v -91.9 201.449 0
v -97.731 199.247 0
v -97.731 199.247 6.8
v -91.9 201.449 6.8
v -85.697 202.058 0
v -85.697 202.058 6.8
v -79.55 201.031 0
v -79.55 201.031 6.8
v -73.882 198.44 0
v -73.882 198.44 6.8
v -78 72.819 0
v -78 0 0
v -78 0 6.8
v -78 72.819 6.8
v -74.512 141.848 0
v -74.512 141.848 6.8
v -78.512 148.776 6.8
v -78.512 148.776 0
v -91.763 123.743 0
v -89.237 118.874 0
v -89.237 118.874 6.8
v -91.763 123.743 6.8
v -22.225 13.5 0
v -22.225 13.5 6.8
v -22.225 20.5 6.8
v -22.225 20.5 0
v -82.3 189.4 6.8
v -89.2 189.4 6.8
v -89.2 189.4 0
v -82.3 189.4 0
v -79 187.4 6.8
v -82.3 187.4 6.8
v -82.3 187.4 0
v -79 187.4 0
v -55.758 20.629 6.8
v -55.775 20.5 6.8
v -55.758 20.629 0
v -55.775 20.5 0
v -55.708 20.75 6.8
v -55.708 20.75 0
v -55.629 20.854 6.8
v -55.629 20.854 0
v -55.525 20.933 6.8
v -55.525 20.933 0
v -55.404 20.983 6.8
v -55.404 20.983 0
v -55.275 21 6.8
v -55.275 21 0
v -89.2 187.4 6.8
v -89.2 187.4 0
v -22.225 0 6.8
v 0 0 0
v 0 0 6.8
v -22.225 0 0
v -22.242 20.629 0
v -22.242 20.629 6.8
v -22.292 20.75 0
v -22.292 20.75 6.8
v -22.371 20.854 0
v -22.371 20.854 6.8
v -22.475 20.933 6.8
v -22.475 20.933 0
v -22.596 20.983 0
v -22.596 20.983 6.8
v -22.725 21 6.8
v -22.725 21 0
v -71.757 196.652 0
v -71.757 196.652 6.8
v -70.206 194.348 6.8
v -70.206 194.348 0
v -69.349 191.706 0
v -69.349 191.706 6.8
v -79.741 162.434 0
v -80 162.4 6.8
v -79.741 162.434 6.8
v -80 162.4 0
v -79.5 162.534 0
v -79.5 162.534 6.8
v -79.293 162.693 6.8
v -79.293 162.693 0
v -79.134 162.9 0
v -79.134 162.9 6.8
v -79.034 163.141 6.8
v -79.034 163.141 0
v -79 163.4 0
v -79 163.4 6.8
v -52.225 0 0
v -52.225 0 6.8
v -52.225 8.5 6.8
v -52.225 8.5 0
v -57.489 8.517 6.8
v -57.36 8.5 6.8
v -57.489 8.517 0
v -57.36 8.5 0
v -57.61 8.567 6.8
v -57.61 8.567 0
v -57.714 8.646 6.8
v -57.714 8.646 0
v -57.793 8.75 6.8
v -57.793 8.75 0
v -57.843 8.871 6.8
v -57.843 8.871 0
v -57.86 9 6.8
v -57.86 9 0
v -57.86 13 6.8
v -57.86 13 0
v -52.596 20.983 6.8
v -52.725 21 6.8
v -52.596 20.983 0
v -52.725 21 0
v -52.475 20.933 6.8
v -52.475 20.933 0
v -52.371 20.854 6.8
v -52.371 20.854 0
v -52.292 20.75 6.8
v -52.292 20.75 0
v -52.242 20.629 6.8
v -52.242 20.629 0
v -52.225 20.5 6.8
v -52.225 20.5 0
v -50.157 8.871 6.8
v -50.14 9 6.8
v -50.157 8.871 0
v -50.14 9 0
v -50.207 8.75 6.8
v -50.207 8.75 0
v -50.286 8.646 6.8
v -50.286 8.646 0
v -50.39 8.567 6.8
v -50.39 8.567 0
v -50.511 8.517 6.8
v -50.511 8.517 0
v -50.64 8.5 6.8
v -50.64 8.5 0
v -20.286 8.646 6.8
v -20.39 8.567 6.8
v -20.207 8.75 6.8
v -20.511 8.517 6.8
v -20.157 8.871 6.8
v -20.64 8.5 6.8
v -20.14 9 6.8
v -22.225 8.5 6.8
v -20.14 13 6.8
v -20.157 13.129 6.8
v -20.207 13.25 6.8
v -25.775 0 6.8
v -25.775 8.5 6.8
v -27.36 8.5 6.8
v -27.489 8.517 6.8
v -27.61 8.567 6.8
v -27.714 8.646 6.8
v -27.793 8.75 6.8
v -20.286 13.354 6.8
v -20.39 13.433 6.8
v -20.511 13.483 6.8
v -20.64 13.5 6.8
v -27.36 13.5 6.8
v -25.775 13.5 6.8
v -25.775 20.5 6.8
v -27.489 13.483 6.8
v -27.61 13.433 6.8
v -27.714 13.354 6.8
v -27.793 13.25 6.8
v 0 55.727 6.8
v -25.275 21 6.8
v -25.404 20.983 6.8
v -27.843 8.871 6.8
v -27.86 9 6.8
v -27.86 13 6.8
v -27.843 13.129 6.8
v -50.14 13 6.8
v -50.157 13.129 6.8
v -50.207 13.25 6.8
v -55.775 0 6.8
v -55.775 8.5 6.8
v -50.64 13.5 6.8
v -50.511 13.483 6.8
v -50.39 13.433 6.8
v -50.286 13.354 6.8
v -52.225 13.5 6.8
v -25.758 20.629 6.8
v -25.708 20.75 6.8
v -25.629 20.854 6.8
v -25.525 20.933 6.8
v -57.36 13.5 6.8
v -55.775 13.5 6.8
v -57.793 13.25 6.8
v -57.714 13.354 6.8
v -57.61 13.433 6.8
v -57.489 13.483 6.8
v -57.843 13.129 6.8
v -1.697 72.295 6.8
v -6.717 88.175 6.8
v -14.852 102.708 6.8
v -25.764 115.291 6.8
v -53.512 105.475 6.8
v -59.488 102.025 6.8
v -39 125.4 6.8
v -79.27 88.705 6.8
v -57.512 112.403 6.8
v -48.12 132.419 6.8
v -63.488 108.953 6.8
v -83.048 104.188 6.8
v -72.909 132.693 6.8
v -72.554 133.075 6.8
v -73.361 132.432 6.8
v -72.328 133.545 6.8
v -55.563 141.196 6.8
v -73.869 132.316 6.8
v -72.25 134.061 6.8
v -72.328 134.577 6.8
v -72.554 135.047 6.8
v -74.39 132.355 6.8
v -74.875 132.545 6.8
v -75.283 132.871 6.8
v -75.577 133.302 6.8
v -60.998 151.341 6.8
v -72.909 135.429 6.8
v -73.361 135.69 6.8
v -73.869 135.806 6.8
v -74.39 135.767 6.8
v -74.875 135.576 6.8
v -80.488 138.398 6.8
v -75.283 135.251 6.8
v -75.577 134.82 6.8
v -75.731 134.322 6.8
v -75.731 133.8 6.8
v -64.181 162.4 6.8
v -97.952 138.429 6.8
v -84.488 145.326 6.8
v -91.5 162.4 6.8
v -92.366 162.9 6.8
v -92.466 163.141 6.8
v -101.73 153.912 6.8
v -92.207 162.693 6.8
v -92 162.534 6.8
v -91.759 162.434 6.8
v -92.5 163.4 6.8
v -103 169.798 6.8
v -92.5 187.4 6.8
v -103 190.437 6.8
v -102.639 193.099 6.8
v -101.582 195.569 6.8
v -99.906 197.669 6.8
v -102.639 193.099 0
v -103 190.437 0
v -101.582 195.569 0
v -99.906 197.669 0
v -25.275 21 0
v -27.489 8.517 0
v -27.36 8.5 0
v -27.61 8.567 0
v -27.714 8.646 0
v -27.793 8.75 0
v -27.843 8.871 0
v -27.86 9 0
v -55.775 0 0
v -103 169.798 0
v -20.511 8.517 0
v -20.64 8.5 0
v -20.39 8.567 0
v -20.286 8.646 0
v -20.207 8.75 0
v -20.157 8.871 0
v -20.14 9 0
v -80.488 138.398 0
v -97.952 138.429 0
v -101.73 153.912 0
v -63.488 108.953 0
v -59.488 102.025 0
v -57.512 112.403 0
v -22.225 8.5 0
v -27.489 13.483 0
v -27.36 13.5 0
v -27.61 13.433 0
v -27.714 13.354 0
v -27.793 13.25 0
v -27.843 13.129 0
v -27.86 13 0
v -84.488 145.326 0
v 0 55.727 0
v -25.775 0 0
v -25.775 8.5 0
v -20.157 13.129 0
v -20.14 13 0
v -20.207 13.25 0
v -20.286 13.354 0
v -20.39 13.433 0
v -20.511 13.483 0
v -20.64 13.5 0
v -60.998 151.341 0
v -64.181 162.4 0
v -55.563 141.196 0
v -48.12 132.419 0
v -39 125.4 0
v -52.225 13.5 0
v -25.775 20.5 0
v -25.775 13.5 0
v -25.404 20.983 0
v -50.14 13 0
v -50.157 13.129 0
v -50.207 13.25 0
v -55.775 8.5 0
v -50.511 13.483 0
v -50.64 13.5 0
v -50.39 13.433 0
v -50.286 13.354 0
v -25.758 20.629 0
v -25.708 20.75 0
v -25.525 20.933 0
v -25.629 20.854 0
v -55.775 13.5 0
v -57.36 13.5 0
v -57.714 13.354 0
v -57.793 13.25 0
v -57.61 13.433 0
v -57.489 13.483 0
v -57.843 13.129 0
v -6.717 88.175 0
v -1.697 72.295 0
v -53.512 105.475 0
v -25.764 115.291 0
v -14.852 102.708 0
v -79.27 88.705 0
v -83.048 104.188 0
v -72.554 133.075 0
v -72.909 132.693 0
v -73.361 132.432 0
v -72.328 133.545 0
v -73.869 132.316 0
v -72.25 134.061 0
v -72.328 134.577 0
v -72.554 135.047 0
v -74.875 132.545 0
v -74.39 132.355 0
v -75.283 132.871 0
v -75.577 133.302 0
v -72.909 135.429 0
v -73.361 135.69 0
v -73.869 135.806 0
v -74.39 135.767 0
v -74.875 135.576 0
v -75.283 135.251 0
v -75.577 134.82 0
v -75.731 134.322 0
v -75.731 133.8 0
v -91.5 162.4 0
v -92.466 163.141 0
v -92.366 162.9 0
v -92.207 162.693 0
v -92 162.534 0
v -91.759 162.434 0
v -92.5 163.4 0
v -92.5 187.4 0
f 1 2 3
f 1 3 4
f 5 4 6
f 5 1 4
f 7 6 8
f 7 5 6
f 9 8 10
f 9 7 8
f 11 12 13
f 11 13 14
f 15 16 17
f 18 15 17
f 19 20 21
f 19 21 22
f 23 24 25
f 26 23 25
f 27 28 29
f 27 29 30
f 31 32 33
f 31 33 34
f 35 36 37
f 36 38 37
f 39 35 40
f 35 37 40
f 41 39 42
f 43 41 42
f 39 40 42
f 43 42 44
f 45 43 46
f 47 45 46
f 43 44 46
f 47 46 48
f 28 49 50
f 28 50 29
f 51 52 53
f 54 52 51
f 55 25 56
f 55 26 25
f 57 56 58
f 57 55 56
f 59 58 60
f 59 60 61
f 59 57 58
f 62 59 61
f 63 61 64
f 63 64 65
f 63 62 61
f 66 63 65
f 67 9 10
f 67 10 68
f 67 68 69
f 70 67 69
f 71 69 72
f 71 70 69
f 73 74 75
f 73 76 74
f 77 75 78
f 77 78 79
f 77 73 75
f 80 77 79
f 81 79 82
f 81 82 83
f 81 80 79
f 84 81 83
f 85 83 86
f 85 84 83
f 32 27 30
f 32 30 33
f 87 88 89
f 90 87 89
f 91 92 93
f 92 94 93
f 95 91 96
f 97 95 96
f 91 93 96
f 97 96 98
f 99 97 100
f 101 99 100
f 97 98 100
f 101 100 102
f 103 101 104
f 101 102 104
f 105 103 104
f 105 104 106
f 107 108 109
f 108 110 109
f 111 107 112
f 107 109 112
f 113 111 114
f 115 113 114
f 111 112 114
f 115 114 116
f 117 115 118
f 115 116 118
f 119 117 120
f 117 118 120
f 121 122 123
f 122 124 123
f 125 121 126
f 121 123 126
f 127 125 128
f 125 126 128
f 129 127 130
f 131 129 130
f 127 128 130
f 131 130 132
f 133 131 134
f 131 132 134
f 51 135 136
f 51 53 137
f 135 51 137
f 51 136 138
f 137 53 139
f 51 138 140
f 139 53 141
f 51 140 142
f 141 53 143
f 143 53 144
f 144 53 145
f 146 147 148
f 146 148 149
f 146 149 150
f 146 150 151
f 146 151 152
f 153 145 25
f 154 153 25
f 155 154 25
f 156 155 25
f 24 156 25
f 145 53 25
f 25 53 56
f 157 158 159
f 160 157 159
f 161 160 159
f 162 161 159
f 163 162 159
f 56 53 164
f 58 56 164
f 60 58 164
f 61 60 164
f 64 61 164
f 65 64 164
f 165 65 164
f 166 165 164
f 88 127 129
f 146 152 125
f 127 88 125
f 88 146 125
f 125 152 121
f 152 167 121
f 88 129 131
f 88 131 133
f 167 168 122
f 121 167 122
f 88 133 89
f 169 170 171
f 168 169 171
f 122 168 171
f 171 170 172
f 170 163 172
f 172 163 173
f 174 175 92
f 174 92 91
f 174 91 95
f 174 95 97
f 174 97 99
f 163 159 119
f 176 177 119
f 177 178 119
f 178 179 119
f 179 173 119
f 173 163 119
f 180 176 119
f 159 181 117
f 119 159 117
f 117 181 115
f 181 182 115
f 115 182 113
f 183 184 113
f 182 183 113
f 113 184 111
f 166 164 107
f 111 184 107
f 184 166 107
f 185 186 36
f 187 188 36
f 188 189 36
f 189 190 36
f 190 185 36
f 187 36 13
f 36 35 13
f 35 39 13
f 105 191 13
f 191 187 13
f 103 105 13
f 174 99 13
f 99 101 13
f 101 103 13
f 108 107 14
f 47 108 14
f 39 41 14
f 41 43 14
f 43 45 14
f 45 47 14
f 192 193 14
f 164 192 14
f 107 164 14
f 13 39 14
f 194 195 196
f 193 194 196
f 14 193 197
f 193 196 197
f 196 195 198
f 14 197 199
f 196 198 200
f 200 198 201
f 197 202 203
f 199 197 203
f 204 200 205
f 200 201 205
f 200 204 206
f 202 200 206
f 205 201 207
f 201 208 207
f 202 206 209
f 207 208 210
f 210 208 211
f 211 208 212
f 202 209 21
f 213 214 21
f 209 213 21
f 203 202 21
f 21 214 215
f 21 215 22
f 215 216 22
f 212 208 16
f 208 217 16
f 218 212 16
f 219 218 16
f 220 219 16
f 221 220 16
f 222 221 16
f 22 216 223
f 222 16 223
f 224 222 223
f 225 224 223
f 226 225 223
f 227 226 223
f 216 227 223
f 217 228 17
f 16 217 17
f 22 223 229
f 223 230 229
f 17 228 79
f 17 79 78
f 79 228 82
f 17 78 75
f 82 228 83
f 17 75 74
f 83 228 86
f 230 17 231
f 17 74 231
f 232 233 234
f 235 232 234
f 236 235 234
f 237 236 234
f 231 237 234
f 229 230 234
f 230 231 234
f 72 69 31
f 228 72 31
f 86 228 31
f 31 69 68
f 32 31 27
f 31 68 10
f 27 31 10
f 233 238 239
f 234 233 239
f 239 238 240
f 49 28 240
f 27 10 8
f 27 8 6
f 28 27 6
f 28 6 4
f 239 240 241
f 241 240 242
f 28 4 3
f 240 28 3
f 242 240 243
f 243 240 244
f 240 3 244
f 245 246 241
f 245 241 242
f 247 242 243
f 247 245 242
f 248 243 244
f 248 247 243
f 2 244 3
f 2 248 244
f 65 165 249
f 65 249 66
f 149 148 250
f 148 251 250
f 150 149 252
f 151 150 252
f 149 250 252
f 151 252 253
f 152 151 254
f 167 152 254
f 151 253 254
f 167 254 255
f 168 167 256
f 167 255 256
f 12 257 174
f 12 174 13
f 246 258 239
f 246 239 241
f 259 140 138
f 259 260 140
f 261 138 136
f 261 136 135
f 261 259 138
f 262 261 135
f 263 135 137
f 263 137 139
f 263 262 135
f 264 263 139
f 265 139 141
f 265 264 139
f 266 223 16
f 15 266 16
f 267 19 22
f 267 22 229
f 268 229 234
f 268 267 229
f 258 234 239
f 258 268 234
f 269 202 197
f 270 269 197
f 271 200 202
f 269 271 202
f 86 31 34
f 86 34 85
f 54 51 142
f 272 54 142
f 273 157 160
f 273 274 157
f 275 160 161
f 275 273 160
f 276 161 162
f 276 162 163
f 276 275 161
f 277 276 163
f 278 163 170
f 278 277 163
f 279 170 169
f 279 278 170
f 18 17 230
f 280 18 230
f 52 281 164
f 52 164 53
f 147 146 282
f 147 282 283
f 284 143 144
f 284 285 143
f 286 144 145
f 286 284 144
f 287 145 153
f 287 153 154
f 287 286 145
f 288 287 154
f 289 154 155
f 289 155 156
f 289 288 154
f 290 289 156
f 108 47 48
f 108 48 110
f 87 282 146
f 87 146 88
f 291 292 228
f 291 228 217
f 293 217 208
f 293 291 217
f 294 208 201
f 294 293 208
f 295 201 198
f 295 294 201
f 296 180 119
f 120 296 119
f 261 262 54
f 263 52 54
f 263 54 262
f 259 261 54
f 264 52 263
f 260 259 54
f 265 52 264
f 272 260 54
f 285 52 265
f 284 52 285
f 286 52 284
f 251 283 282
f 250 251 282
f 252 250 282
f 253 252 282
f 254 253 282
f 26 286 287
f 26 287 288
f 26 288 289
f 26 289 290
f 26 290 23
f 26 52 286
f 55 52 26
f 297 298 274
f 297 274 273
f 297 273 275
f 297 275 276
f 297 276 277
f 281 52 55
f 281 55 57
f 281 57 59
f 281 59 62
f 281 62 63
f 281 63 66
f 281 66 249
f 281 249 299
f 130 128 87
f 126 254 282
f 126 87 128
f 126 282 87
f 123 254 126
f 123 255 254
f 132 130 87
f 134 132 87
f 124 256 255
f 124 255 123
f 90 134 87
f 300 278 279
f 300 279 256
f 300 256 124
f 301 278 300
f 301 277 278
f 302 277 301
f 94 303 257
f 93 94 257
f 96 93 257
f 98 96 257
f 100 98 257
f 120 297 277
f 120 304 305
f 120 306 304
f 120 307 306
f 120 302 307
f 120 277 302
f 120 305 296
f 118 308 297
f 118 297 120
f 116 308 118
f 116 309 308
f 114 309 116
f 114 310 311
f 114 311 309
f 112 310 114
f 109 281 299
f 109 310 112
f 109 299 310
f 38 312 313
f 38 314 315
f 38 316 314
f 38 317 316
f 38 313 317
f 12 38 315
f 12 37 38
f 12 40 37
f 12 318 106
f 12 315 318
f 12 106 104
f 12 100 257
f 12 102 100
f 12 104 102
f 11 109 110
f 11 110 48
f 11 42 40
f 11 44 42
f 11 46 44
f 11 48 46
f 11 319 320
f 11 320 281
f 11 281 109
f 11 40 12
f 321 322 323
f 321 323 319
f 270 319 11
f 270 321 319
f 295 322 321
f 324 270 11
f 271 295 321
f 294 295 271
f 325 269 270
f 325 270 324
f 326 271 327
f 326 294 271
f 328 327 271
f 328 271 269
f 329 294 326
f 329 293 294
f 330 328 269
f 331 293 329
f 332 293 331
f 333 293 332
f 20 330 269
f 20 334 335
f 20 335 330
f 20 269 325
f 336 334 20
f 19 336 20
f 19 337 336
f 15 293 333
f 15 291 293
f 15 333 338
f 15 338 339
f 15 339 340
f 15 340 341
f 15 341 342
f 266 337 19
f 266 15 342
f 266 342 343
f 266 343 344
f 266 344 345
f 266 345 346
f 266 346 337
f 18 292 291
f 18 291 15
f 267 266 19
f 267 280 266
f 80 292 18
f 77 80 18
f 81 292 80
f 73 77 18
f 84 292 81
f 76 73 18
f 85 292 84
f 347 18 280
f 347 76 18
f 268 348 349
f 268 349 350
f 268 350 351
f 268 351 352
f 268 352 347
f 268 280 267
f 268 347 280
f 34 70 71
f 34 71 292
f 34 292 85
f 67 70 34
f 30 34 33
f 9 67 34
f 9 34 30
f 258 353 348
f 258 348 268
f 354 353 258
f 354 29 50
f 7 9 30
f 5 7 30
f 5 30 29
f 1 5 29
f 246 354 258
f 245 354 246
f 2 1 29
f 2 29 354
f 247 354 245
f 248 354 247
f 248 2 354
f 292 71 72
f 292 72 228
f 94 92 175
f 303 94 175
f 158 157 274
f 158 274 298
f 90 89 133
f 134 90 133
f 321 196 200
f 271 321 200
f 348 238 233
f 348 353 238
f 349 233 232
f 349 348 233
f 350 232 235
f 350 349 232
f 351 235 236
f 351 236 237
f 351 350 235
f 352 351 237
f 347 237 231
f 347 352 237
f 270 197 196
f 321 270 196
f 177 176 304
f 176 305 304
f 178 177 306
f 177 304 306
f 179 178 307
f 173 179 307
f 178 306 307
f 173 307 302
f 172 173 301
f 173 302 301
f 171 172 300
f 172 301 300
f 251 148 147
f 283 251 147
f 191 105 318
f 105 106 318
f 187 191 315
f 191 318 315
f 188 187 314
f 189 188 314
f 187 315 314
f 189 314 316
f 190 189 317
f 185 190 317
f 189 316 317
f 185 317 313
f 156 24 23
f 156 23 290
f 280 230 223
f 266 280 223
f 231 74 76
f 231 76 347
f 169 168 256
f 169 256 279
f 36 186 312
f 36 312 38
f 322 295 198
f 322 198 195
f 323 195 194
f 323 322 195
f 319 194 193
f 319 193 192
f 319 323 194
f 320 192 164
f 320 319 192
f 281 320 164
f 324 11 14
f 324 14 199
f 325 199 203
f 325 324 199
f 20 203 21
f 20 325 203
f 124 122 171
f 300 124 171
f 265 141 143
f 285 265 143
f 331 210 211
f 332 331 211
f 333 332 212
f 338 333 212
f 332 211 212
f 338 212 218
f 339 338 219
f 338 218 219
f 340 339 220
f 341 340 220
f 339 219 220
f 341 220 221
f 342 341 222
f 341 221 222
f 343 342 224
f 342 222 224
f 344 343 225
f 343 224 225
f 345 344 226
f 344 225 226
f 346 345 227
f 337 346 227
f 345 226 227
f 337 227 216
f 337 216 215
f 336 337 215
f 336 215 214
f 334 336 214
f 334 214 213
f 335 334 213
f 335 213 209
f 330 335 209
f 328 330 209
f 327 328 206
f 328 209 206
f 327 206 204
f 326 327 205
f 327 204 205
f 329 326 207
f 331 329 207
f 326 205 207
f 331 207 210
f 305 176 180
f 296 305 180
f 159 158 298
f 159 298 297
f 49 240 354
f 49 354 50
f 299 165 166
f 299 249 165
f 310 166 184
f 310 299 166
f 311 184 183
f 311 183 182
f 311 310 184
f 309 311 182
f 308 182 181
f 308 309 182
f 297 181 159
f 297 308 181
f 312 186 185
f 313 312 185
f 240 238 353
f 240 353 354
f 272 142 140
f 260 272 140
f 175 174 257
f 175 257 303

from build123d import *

# Parameters (mm, degrees)
BOSS_EXTRUDE1_DEPTH = 6.8
SKETCH2_W           = 2.085
SKETCH2_H           = 5
SKETCH2_W_2         = 3.55
SKETCH2_H_2         = 8.5
SKETCH2_H_3         = 7.5
CUT_EXTRUDE1_DEPTH  = 6.8
CUT_EXTRUDE2_DEPTH  = 6.8
SKETCH4_R           = 1.75
CUT_EXTRUDE3_DEPTH  = 6.8
FILLET1_R           = 1
FILLET2_R           = 0.5


with BuildPart() as part:
    # Sketch1 → Boss-Extrude1 (new body)
    with BuildSketch(Plane.XY):
        with BuildLine():
            Line((-103, 169.798422238), (-103, 190.436528082))
            ThreePointArc((-103, 190.436528082), (-101.582115005, 195.569490389), (-97.730539592, 199.246862648))
            ThreePointArc((-97.730539592, 199.246862648), (-85.697338027, 202.057615588), (-73.881600239, 198.440073256))
            ThreePointArc((-73.881600239, 198.440073256), (-70.90110432, 195.553704599), (-69.348658208, 191.706057135))
            Line((-69.348658208, 191.706057135), (-64.181209637, 162.4))
            ThreePointArc((-64.181209637, 162.4), (-55.56310459, 141.196422986), (-39, 125.4))
            ThreePointArc((-39, 125.4), (-10.413345727, 95.649656796), (0, 55.726706578))
            Line((0, 55.726706578), (0, 0))
            Line((0, 0), (-78, 0))
            Line((-78, 0), (-78, 72.818559508))
            ThreePointArc((-78, 72.818559508), (-80.849795474, 96.521676613), (-89.23675521, 118.873813001))
            Line((-89.23675521, 118.873813001), (-91.76324479, 123.743168745))
            ThreePointArc((-91.76324479, 123.743168745), (-100.150204526, 146.095305133), (-103, 169.798422238))
        make_face()
    extrude(amount=BOSS_EXTRUDE1_DEPTH)

    # Sketch2 → Cut-Extrude1 (cut)
    with BuildSketch(Plane.XY.offset(6.8)):
        with Locations((-51.1825, 11)):
            Rectangle(SKETCH2_W, SKETCH2_H)
        with Locations((-54, 11)):
            Rectangle(SKETCH2_W_2, SKETCH2_H)
        with Locations((-56.8175, 11)):
            Rectangle(SKETCH2_W, SKETCH2_H)
        with Locations((-54, 4.25)):
            Rectangle(SKETCH2_W_2, SKETCH2_H_2)
        with Locations((-54, 17.25)):
            Rectangle(SKETCH2_W_2, SKETCH2_H_3)
        with Locations((-26.8175, 11)):
            Rectangle(SKETCH2_W, SKETCH2_H)
        with Locations((-21.1825, 11)):
            Rectangle(SKETCH2_W, SKETCH2_H)
        with Locations((-24, 17.25)):
            Rectangle(SKETCH2_W_2, SKETCH2_H_3)
        with Locations((-24, 11)):
            Rectangle(SKETCH2_W_2, SKETCH2_H)
        with Locations((-24, 4.25)):
            Rectangle(SKETCH2_W_2, SKETCH2_H_2)
    extrude(amount=-CUT_EXTRUDE1_DEPTH, mode=Mode.SUBTRACT)

    # Sketch3 → Cut-Extrude2 (cut)
    with BuildSketch(Plane.XY.offset(6.8)):
        Polygon((-89.2, 187.4), (-89.2, 189.4), (-82.3, 189.4), (-82.3, 187.4), (-79, 187.4), (-79, 162.4), (-92.5, 162.4), (-92.5, 187.4), align=None)
    extrude(amount=-CUT_EXTRUDE2_DEPTH, mode=Mode.SUBTRACT)

    # Sketch4 → Cut-Extrude3 (cut)
    with BuildSketch(Plane.XY.offset(6.8)):
        with Locations((-74.000212357, 134.060889132)):
            Circle(SKETCH4_R)
        Polygon((-84.488, 145.326270189), (-80.488, 138.398066959), (-74.512424714, 141.848066959), (-78.512424714, 148.776270189), align=None)
        Polygon((-63.488, 108.95320323), (-59.488, 102.025), (-53.512424714, 105.475), (-57.512424714, 112.40320323), align=None)
    extrude(amount=-CUT_EXTRUDE3_DEPTH, mode=Mode.SUBTRACT)

    # Fillet1
    fillet1_edges = [part.edges().sort_by_distance(p)[0] for p in [
        (-79, 162.4, 3.4),
        (-92.5, 162.4, 3.4),
    ]]
    fillet(fillet1_edges, radius=FILLET1_R)

    # Fillet2
    fillet2_edges = [part.edges().sort_by_distance(p)[0] for p in [
        (-50.14, 13.5, 3.4),
        (-50.14, 8.5, 3.4),
        (-57.86, 8.5, 3.4),
        (-57.86, 13.5, 3.4),
        (-55.775, 21, 3.4),
        (-52.225, 21, 3.4),
        (-27.86, 8.5, 3.4),
        (-27.86, 13.5, 3.4),
        (-25.775, 21, 3.4),
        (-22.225, 21, 3.4),
        (-20.14, 13.5, 3.4),
        (-20.14, 8.5, 3.4),
    ]]
    fillet(fillet2_edges, radius=FILLET2_R)


solid = part.part
